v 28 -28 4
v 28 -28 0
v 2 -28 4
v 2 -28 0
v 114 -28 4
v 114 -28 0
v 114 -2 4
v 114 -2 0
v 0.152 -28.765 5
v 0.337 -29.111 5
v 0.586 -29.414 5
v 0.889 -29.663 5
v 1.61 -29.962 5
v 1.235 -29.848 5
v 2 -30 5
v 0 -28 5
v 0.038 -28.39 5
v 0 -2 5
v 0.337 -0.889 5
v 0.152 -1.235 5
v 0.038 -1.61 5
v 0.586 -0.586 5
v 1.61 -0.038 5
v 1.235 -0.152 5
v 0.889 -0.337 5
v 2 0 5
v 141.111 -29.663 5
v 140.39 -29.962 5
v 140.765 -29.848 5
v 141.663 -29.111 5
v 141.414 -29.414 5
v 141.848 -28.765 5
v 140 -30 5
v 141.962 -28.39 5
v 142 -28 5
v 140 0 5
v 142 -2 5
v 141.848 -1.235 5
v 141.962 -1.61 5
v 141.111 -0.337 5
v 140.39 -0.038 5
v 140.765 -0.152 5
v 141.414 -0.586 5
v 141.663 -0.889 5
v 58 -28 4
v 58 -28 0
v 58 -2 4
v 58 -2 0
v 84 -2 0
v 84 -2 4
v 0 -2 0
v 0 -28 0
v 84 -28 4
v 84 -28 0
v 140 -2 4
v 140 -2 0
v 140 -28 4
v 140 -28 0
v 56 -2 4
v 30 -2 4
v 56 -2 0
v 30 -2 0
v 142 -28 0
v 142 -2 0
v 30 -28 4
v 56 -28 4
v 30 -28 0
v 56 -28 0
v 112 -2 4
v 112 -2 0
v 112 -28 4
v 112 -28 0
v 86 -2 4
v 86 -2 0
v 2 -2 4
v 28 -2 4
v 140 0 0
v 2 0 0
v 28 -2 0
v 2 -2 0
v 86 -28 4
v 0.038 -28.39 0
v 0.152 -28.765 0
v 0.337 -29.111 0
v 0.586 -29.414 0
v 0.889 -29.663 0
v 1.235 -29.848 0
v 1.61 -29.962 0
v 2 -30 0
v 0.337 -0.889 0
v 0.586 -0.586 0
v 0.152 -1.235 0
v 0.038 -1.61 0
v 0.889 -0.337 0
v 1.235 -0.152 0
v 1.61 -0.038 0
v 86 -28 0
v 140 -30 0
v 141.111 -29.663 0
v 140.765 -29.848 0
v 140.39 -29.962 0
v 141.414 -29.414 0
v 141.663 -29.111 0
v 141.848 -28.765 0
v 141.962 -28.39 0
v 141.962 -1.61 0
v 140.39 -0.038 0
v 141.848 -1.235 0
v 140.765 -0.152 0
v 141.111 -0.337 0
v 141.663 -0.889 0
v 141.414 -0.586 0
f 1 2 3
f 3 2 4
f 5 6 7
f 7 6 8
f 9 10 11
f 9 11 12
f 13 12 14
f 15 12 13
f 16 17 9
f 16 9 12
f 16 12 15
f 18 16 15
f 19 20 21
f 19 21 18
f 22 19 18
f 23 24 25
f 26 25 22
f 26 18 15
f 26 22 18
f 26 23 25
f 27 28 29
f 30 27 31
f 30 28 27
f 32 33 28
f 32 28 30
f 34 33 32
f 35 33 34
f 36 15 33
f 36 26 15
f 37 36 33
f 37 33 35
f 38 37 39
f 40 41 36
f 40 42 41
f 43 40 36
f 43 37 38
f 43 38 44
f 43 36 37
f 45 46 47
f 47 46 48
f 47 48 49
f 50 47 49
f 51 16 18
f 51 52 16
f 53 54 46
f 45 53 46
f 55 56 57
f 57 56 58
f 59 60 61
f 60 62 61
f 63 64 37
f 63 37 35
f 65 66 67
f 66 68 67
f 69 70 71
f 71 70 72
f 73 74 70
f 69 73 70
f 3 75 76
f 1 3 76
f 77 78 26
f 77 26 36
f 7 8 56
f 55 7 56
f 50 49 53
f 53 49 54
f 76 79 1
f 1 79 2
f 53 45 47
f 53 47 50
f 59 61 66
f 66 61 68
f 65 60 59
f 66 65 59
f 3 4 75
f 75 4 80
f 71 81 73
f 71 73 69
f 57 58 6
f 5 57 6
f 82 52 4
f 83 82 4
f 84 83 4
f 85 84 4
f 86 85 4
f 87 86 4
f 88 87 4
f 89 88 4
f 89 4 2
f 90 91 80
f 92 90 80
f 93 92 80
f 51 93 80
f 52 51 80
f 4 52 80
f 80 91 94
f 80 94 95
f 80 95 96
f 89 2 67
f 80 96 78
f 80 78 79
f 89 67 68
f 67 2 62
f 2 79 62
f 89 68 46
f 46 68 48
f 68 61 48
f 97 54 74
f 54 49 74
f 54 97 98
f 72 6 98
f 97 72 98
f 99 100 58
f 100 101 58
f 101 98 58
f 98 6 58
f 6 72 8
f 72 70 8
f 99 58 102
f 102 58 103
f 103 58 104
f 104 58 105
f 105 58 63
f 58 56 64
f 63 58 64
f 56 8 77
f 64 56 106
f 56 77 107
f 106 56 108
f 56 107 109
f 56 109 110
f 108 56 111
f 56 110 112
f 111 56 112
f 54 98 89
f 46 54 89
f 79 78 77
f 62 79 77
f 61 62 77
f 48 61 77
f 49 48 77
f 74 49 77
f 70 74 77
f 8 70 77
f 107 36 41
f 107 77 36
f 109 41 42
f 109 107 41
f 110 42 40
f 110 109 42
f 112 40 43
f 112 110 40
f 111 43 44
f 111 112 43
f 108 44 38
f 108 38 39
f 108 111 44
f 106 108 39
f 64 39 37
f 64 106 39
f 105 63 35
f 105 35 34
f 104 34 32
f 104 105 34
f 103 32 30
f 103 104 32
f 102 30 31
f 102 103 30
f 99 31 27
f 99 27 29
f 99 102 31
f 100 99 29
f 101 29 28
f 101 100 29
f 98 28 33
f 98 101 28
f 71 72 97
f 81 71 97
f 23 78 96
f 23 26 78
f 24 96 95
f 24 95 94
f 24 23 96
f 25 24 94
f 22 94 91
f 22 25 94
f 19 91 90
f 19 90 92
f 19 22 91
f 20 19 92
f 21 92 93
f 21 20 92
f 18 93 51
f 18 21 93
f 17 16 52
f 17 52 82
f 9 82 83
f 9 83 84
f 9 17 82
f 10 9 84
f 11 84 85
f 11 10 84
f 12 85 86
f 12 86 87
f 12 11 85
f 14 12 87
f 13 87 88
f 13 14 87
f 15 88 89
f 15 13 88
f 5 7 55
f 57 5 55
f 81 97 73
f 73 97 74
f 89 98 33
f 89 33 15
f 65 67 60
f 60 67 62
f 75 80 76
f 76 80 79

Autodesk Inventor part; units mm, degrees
ref_plane "YZ Plane" through (0, 0, 0) normal (1, 0, 0) x (0, 1, 0)
ref_plane "XZ Plane" through (0, 0, 0) normal (0, 1, 0) x (-1, 0, 0)
ref_plane "XY Plane" through (0, 0, 0) normal (0, 0, 1) x (1, 0, 0)
sketch "스케치1" plane through (0, 0, 0) normal (0, 0, 1) x (1, 0, 0)
  line L0 (0, 0) -> (142, 0)
  line L1 (142, 0) -> (142, -30)
  line L2 (142, -30) -> (0, -30)
  line L3 (0, -30) -> (0, 0)
  line L4 (2, -2) -> (28, -2)
  line L5 (28, -2) -> (28, -28)
  line L6 (28, -28) -> (2, -28)
  line L7 (2, -28) -> (2, -2)
  line L8 (56, -2) -> (56, -28)
  line L9 (30, -2) -> (56, -2)
  line L10 (30, -28) -> (30, -2)
  line L11 (56, -28) -> (30, -28)
  line L12 (84, -2) -> (84, -28)
  line L13 (58, -2) -> (84, -2)
  line L14 (58, -28) -> (58, -2)
  line L15 (84, -28) -> (58, -28)
  line L16 (112, -2) -> (112, -28)
  line L17 (86, -2) -> (112, -2)
  line L18 (86, -28) -> (86, -2)
  line L19 (112, -28) -> (86, -28)
  line L20 (140, -2) -> (140, -28)
  line L21 (114, -2) -> (140, -2)
  line L22 (114, -28) -> (114, -2)
  line L23 (140, -28) -> (114, -28)
  dimension "d0" = 142
  dimension "d1" = 30
  dimension "d2" = 2
  dimension "d3" = 2
  dimension "d4" = 26
  dimension "d5" = 26
  dimension "d8" = 28
extrude "돌출1" add sketch "스케치1" along normal blind 4
sketch "스케치2" plane through (0, 0, 4) normal (0, 0, 1) x (1, 0, 0)
  line L0 (0, -30) -> (142, -30) projected
  line L1 (142, -30) -> (142, 0) projected
  line L2 (142, 0) -> (0, 0) projected
  line L3 (0, 0) -> (0, -30) projected
  line L4 (140, -2) -> (140, -28) projected
  line L5 (140, -28) -> (114, -28) projected
  line L6 (114, -28) -> (114, -2) projected
  line L7 (114, -2) -> (140, -2) projected
  line L8 (112, -2) -> (112, -28) projected
  line L9 (112, -28) -> (86, -28) projected
  line L10 (86, -28) -> (86, -2) projected
  line L11 (86, -2) -> (112, -2) projected
  line L12 (84, -2) -> (84, -28) projected
  line L13 (84, -28) -> (58, -28) projected
  line L14 (58, -28) -> (58, -2) projected
  line L15 (58, -2) -> (84, -2) projected
  line L16 (56, -2) -> (56, -28) projected
  line L17 (56, -28) -> (30, -28) projected
  line L18 (30, -28) -> (30, -2) projected
  line L19 (30, -2) -> (56, -2) projected
  line L20 (2, -2) -> (28, -2) projected
  line L21 (28, -2) -> (28, -28) projected
  line L22 (28, -28) -> (2, -28) projected
  line L23 (2, -28) -> (2, -2) projected
extrude "돌출2" add sketch "스케치2" along normal blind 1 contours L3 L2 L1 L0 | L4 L5 L6 L7 | L8 L9 L10 L11 | L12 L13 L14 L15 | L16 L17 L18 L19 | L20 L21 L22 L23
fillet "모깎기1" radius 2 4 edges at (142, 0, 2.5) (142, -30, 2.5) (0, 0, 2.5) (0, -30, 2.5)
properties part number "t_pocket"
